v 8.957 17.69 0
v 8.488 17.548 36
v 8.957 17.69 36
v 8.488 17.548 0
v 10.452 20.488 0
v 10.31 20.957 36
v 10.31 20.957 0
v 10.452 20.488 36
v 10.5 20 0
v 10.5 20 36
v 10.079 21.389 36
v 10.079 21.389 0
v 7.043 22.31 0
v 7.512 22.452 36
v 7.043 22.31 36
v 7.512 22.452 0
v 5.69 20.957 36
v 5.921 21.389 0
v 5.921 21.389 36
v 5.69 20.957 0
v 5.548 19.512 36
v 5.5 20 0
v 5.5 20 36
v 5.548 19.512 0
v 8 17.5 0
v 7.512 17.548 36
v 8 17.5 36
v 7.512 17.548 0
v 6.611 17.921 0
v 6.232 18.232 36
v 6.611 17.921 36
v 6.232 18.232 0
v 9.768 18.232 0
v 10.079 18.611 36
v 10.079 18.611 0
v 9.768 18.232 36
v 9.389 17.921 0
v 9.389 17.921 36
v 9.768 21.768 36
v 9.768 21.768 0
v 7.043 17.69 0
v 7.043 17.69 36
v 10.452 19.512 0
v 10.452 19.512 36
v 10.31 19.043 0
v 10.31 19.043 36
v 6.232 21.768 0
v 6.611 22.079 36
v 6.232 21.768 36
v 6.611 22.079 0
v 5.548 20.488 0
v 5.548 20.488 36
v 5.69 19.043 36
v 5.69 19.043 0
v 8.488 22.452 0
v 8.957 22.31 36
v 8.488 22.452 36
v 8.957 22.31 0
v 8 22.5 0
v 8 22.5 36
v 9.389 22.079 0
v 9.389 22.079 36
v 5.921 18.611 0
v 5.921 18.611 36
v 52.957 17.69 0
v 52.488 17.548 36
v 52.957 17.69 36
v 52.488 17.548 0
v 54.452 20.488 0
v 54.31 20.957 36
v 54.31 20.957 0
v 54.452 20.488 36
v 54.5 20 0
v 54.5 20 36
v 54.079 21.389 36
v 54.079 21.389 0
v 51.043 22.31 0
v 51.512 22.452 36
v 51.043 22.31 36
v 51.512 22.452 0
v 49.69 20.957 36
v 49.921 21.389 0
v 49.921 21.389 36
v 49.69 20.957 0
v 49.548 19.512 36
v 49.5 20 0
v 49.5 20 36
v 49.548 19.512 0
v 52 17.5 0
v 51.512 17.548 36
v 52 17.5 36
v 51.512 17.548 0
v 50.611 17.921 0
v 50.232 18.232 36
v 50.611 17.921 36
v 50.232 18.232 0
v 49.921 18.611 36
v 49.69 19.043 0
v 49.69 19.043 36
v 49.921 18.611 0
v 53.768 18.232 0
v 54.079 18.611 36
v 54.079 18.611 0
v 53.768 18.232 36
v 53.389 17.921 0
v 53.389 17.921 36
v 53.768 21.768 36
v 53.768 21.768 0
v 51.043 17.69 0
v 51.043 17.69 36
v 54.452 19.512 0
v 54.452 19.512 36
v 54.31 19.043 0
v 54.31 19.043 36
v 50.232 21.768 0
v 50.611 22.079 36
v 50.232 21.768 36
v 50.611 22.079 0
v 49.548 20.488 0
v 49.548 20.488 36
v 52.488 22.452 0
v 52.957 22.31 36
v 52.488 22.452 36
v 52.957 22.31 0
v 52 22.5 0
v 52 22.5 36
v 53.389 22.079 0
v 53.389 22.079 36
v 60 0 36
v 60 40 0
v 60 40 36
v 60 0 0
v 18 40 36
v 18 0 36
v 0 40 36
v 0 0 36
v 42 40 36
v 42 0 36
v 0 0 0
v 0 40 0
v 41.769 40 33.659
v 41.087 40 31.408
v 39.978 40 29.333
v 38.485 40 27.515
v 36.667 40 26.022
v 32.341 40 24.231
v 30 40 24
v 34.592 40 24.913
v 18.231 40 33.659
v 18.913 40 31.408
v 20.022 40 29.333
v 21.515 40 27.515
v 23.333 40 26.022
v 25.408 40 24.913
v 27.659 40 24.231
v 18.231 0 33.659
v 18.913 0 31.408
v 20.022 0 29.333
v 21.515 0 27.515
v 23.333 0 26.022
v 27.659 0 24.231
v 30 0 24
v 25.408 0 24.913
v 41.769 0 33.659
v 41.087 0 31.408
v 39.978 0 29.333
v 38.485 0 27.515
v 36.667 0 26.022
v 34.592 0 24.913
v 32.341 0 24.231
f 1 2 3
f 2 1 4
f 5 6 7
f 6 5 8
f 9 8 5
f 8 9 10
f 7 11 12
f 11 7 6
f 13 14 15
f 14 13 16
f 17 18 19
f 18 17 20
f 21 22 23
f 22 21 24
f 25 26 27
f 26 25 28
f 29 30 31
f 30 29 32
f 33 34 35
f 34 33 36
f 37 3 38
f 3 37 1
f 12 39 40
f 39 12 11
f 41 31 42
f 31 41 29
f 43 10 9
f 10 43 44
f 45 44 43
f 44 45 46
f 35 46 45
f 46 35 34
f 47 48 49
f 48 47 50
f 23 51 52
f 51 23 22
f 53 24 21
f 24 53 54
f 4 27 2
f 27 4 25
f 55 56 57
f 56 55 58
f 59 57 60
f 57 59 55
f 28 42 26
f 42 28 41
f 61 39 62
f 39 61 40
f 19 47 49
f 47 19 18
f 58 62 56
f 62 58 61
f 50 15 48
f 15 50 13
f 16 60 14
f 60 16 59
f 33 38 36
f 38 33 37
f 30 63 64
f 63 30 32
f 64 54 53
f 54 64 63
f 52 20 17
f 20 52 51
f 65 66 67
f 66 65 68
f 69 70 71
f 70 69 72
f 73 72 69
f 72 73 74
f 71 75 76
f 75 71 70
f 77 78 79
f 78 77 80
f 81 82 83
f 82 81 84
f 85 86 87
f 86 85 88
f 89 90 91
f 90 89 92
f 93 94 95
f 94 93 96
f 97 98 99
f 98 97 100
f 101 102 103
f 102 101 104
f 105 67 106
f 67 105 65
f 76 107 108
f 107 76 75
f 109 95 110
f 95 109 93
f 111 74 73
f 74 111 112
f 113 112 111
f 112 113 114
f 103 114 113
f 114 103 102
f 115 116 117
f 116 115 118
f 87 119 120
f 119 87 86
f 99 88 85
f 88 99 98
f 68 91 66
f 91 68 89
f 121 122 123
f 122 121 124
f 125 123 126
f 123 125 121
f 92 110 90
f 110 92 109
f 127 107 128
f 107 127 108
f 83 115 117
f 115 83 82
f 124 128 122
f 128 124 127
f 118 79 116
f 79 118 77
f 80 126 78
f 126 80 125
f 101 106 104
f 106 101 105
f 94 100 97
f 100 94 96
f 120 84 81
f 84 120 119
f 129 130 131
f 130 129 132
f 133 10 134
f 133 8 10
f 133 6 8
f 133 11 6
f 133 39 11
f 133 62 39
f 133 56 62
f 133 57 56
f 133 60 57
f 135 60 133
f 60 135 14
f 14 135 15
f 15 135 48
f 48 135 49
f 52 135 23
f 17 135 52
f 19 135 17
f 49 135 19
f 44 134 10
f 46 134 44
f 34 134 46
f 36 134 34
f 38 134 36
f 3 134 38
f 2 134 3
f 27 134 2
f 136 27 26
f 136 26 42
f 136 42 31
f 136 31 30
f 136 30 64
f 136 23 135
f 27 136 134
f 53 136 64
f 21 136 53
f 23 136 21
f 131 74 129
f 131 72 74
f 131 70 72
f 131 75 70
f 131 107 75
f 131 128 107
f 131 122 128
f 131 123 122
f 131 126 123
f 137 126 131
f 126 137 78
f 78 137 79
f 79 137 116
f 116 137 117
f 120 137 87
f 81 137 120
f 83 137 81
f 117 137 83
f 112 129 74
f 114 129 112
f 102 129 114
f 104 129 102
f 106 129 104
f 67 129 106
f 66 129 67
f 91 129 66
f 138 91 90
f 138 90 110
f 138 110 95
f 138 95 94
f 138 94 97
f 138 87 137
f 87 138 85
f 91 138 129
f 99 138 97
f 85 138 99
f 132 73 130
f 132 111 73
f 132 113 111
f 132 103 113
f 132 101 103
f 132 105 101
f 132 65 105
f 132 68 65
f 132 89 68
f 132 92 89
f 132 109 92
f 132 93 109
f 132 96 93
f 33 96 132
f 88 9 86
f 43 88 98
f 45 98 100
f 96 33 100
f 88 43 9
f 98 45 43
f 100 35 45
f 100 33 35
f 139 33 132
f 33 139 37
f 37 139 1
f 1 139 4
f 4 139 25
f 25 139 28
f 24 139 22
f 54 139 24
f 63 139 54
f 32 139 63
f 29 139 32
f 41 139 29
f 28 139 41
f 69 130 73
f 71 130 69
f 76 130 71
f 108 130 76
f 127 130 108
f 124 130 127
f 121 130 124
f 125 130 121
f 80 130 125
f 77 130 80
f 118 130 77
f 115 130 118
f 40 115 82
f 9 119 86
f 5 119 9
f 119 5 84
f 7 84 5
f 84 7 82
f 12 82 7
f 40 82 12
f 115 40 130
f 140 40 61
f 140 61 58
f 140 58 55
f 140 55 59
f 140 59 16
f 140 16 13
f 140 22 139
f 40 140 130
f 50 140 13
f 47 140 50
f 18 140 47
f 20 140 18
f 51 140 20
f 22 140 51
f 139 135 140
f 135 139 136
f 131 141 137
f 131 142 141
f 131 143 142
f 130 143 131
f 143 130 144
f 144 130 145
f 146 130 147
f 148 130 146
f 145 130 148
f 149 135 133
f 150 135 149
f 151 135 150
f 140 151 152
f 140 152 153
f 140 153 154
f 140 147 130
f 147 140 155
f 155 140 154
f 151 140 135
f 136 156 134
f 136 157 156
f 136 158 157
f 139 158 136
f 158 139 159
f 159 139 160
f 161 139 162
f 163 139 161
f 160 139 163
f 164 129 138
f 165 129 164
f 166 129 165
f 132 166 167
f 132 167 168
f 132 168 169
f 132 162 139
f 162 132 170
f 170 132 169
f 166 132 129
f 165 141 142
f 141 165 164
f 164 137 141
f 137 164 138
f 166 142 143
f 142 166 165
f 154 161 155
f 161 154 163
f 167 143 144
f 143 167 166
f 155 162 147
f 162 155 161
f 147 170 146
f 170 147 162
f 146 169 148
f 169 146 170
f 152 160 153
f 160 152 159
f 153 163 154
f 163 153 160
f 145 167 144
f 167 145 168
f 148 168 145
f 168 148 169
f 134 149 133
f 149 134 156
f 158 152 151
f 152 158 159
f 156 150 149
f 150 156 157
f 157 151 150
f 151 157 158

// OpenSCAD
$fn = 32;

// ----------------------------------------------------------------------
// Saddle clamp: plain shaft clamp
// ----------------------------------------------------------------------

// --- parameters (mm) ---
blk_l = 60;               // block length, X
blk_w = 40;               // block width, Y
blk_h = 36;               // block height
clamp_r = 12;             // shaft groove radius
hole_r = 2.5;             // bolt hole radius
hole_m = 8;               // bolt hole margin from the ends
fit_tol = 0.05;           // tolerance for press fits, mm
free_tol = 0.2;           // tolerance for clearance fits, mm

saw_depth = clamp_r + 3;  // saw kerf depth

difference() {
  cube([blk_l, blk_w, blk_h]);
  translate([blk_l / 2, -1, blk_h])
    rotate([-90, 0, 0])
      cylinder(h = blk_w + 2, r = clamp_r);
  for (sx = [0, 1])
    translate([sx ? blk_l - hole_m : hole_m, blk_w / 2, -1])
      cylinder(r = hole_r, h = blk_h + 2);
}
